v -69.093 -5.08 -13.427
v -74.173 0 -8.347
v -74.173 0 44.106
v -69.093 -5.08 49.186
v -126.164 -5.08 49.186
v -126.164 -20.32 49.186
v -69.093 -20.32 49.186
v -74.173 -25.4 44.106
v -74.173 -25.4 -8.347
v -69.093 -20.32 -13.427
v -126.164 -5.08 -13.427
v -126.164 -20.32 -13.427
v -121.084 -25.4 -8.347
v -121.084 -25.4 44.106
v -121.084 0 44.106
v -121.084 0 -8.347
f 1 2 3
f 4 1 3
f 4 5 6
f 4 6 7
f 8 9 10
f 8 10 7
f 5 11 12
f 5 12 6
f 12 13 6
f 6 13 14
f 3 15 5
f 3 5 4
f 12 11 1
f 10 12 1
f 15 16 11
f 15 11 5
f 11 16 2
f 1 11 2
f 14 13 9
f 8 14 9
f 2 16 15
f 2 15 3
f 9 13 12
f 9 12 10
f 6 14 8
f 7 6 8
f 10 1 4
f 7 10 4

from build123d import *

# Parameters (mm, degrees)
F0_W     = 57.070940733
F0_H     = 62.6132022589
F1_DEPTH = 25.4
F0_W_2   = 13.6159174144
F0_H_2   = 7.0780348033
F3_SIZE  = 5.08


with BuildPart() as f1:
    # F0 (on Front) → F1 (new body)
    with BuildSketch(Plane.XZ):
        with Locations((-97.6289659739, 17.8792783991)):
            Rectangle(F0_W, F0_H)
    extrude(amount=F1_DEPTH)

    # F3
    f3_edges = [f1.edges().sort_by_distance(p)[0] for p in [
        (-97.628966, -25.4, 49.18588),
        (-126.164436, -25.4, 17.879278),
        (-97.628966, -25.4, -13.427323),
        (-69.093496, -25.4, 17.879278),
        (-97.628966, 0, 49.18588),
        (-126.164436, 0, 17.879278),
        (-97.628966, 0, -13.427323),
        (-69.093496, 0, 17.879278),
    ]]
    chamfer(f3_edges, length=F3_SIZE)


with BuildPart() as f1b:
    # F0 (on Front) → F1, piece 2 (new body)
    with BuildSketch(Plane.XZ):
        with Locations((-56.7812416703, -20.881687291)):
            Rectangle(F0_W_2, F0_H_2)
    extrude(amount=F1_DEPTH)


solid = f1.part
